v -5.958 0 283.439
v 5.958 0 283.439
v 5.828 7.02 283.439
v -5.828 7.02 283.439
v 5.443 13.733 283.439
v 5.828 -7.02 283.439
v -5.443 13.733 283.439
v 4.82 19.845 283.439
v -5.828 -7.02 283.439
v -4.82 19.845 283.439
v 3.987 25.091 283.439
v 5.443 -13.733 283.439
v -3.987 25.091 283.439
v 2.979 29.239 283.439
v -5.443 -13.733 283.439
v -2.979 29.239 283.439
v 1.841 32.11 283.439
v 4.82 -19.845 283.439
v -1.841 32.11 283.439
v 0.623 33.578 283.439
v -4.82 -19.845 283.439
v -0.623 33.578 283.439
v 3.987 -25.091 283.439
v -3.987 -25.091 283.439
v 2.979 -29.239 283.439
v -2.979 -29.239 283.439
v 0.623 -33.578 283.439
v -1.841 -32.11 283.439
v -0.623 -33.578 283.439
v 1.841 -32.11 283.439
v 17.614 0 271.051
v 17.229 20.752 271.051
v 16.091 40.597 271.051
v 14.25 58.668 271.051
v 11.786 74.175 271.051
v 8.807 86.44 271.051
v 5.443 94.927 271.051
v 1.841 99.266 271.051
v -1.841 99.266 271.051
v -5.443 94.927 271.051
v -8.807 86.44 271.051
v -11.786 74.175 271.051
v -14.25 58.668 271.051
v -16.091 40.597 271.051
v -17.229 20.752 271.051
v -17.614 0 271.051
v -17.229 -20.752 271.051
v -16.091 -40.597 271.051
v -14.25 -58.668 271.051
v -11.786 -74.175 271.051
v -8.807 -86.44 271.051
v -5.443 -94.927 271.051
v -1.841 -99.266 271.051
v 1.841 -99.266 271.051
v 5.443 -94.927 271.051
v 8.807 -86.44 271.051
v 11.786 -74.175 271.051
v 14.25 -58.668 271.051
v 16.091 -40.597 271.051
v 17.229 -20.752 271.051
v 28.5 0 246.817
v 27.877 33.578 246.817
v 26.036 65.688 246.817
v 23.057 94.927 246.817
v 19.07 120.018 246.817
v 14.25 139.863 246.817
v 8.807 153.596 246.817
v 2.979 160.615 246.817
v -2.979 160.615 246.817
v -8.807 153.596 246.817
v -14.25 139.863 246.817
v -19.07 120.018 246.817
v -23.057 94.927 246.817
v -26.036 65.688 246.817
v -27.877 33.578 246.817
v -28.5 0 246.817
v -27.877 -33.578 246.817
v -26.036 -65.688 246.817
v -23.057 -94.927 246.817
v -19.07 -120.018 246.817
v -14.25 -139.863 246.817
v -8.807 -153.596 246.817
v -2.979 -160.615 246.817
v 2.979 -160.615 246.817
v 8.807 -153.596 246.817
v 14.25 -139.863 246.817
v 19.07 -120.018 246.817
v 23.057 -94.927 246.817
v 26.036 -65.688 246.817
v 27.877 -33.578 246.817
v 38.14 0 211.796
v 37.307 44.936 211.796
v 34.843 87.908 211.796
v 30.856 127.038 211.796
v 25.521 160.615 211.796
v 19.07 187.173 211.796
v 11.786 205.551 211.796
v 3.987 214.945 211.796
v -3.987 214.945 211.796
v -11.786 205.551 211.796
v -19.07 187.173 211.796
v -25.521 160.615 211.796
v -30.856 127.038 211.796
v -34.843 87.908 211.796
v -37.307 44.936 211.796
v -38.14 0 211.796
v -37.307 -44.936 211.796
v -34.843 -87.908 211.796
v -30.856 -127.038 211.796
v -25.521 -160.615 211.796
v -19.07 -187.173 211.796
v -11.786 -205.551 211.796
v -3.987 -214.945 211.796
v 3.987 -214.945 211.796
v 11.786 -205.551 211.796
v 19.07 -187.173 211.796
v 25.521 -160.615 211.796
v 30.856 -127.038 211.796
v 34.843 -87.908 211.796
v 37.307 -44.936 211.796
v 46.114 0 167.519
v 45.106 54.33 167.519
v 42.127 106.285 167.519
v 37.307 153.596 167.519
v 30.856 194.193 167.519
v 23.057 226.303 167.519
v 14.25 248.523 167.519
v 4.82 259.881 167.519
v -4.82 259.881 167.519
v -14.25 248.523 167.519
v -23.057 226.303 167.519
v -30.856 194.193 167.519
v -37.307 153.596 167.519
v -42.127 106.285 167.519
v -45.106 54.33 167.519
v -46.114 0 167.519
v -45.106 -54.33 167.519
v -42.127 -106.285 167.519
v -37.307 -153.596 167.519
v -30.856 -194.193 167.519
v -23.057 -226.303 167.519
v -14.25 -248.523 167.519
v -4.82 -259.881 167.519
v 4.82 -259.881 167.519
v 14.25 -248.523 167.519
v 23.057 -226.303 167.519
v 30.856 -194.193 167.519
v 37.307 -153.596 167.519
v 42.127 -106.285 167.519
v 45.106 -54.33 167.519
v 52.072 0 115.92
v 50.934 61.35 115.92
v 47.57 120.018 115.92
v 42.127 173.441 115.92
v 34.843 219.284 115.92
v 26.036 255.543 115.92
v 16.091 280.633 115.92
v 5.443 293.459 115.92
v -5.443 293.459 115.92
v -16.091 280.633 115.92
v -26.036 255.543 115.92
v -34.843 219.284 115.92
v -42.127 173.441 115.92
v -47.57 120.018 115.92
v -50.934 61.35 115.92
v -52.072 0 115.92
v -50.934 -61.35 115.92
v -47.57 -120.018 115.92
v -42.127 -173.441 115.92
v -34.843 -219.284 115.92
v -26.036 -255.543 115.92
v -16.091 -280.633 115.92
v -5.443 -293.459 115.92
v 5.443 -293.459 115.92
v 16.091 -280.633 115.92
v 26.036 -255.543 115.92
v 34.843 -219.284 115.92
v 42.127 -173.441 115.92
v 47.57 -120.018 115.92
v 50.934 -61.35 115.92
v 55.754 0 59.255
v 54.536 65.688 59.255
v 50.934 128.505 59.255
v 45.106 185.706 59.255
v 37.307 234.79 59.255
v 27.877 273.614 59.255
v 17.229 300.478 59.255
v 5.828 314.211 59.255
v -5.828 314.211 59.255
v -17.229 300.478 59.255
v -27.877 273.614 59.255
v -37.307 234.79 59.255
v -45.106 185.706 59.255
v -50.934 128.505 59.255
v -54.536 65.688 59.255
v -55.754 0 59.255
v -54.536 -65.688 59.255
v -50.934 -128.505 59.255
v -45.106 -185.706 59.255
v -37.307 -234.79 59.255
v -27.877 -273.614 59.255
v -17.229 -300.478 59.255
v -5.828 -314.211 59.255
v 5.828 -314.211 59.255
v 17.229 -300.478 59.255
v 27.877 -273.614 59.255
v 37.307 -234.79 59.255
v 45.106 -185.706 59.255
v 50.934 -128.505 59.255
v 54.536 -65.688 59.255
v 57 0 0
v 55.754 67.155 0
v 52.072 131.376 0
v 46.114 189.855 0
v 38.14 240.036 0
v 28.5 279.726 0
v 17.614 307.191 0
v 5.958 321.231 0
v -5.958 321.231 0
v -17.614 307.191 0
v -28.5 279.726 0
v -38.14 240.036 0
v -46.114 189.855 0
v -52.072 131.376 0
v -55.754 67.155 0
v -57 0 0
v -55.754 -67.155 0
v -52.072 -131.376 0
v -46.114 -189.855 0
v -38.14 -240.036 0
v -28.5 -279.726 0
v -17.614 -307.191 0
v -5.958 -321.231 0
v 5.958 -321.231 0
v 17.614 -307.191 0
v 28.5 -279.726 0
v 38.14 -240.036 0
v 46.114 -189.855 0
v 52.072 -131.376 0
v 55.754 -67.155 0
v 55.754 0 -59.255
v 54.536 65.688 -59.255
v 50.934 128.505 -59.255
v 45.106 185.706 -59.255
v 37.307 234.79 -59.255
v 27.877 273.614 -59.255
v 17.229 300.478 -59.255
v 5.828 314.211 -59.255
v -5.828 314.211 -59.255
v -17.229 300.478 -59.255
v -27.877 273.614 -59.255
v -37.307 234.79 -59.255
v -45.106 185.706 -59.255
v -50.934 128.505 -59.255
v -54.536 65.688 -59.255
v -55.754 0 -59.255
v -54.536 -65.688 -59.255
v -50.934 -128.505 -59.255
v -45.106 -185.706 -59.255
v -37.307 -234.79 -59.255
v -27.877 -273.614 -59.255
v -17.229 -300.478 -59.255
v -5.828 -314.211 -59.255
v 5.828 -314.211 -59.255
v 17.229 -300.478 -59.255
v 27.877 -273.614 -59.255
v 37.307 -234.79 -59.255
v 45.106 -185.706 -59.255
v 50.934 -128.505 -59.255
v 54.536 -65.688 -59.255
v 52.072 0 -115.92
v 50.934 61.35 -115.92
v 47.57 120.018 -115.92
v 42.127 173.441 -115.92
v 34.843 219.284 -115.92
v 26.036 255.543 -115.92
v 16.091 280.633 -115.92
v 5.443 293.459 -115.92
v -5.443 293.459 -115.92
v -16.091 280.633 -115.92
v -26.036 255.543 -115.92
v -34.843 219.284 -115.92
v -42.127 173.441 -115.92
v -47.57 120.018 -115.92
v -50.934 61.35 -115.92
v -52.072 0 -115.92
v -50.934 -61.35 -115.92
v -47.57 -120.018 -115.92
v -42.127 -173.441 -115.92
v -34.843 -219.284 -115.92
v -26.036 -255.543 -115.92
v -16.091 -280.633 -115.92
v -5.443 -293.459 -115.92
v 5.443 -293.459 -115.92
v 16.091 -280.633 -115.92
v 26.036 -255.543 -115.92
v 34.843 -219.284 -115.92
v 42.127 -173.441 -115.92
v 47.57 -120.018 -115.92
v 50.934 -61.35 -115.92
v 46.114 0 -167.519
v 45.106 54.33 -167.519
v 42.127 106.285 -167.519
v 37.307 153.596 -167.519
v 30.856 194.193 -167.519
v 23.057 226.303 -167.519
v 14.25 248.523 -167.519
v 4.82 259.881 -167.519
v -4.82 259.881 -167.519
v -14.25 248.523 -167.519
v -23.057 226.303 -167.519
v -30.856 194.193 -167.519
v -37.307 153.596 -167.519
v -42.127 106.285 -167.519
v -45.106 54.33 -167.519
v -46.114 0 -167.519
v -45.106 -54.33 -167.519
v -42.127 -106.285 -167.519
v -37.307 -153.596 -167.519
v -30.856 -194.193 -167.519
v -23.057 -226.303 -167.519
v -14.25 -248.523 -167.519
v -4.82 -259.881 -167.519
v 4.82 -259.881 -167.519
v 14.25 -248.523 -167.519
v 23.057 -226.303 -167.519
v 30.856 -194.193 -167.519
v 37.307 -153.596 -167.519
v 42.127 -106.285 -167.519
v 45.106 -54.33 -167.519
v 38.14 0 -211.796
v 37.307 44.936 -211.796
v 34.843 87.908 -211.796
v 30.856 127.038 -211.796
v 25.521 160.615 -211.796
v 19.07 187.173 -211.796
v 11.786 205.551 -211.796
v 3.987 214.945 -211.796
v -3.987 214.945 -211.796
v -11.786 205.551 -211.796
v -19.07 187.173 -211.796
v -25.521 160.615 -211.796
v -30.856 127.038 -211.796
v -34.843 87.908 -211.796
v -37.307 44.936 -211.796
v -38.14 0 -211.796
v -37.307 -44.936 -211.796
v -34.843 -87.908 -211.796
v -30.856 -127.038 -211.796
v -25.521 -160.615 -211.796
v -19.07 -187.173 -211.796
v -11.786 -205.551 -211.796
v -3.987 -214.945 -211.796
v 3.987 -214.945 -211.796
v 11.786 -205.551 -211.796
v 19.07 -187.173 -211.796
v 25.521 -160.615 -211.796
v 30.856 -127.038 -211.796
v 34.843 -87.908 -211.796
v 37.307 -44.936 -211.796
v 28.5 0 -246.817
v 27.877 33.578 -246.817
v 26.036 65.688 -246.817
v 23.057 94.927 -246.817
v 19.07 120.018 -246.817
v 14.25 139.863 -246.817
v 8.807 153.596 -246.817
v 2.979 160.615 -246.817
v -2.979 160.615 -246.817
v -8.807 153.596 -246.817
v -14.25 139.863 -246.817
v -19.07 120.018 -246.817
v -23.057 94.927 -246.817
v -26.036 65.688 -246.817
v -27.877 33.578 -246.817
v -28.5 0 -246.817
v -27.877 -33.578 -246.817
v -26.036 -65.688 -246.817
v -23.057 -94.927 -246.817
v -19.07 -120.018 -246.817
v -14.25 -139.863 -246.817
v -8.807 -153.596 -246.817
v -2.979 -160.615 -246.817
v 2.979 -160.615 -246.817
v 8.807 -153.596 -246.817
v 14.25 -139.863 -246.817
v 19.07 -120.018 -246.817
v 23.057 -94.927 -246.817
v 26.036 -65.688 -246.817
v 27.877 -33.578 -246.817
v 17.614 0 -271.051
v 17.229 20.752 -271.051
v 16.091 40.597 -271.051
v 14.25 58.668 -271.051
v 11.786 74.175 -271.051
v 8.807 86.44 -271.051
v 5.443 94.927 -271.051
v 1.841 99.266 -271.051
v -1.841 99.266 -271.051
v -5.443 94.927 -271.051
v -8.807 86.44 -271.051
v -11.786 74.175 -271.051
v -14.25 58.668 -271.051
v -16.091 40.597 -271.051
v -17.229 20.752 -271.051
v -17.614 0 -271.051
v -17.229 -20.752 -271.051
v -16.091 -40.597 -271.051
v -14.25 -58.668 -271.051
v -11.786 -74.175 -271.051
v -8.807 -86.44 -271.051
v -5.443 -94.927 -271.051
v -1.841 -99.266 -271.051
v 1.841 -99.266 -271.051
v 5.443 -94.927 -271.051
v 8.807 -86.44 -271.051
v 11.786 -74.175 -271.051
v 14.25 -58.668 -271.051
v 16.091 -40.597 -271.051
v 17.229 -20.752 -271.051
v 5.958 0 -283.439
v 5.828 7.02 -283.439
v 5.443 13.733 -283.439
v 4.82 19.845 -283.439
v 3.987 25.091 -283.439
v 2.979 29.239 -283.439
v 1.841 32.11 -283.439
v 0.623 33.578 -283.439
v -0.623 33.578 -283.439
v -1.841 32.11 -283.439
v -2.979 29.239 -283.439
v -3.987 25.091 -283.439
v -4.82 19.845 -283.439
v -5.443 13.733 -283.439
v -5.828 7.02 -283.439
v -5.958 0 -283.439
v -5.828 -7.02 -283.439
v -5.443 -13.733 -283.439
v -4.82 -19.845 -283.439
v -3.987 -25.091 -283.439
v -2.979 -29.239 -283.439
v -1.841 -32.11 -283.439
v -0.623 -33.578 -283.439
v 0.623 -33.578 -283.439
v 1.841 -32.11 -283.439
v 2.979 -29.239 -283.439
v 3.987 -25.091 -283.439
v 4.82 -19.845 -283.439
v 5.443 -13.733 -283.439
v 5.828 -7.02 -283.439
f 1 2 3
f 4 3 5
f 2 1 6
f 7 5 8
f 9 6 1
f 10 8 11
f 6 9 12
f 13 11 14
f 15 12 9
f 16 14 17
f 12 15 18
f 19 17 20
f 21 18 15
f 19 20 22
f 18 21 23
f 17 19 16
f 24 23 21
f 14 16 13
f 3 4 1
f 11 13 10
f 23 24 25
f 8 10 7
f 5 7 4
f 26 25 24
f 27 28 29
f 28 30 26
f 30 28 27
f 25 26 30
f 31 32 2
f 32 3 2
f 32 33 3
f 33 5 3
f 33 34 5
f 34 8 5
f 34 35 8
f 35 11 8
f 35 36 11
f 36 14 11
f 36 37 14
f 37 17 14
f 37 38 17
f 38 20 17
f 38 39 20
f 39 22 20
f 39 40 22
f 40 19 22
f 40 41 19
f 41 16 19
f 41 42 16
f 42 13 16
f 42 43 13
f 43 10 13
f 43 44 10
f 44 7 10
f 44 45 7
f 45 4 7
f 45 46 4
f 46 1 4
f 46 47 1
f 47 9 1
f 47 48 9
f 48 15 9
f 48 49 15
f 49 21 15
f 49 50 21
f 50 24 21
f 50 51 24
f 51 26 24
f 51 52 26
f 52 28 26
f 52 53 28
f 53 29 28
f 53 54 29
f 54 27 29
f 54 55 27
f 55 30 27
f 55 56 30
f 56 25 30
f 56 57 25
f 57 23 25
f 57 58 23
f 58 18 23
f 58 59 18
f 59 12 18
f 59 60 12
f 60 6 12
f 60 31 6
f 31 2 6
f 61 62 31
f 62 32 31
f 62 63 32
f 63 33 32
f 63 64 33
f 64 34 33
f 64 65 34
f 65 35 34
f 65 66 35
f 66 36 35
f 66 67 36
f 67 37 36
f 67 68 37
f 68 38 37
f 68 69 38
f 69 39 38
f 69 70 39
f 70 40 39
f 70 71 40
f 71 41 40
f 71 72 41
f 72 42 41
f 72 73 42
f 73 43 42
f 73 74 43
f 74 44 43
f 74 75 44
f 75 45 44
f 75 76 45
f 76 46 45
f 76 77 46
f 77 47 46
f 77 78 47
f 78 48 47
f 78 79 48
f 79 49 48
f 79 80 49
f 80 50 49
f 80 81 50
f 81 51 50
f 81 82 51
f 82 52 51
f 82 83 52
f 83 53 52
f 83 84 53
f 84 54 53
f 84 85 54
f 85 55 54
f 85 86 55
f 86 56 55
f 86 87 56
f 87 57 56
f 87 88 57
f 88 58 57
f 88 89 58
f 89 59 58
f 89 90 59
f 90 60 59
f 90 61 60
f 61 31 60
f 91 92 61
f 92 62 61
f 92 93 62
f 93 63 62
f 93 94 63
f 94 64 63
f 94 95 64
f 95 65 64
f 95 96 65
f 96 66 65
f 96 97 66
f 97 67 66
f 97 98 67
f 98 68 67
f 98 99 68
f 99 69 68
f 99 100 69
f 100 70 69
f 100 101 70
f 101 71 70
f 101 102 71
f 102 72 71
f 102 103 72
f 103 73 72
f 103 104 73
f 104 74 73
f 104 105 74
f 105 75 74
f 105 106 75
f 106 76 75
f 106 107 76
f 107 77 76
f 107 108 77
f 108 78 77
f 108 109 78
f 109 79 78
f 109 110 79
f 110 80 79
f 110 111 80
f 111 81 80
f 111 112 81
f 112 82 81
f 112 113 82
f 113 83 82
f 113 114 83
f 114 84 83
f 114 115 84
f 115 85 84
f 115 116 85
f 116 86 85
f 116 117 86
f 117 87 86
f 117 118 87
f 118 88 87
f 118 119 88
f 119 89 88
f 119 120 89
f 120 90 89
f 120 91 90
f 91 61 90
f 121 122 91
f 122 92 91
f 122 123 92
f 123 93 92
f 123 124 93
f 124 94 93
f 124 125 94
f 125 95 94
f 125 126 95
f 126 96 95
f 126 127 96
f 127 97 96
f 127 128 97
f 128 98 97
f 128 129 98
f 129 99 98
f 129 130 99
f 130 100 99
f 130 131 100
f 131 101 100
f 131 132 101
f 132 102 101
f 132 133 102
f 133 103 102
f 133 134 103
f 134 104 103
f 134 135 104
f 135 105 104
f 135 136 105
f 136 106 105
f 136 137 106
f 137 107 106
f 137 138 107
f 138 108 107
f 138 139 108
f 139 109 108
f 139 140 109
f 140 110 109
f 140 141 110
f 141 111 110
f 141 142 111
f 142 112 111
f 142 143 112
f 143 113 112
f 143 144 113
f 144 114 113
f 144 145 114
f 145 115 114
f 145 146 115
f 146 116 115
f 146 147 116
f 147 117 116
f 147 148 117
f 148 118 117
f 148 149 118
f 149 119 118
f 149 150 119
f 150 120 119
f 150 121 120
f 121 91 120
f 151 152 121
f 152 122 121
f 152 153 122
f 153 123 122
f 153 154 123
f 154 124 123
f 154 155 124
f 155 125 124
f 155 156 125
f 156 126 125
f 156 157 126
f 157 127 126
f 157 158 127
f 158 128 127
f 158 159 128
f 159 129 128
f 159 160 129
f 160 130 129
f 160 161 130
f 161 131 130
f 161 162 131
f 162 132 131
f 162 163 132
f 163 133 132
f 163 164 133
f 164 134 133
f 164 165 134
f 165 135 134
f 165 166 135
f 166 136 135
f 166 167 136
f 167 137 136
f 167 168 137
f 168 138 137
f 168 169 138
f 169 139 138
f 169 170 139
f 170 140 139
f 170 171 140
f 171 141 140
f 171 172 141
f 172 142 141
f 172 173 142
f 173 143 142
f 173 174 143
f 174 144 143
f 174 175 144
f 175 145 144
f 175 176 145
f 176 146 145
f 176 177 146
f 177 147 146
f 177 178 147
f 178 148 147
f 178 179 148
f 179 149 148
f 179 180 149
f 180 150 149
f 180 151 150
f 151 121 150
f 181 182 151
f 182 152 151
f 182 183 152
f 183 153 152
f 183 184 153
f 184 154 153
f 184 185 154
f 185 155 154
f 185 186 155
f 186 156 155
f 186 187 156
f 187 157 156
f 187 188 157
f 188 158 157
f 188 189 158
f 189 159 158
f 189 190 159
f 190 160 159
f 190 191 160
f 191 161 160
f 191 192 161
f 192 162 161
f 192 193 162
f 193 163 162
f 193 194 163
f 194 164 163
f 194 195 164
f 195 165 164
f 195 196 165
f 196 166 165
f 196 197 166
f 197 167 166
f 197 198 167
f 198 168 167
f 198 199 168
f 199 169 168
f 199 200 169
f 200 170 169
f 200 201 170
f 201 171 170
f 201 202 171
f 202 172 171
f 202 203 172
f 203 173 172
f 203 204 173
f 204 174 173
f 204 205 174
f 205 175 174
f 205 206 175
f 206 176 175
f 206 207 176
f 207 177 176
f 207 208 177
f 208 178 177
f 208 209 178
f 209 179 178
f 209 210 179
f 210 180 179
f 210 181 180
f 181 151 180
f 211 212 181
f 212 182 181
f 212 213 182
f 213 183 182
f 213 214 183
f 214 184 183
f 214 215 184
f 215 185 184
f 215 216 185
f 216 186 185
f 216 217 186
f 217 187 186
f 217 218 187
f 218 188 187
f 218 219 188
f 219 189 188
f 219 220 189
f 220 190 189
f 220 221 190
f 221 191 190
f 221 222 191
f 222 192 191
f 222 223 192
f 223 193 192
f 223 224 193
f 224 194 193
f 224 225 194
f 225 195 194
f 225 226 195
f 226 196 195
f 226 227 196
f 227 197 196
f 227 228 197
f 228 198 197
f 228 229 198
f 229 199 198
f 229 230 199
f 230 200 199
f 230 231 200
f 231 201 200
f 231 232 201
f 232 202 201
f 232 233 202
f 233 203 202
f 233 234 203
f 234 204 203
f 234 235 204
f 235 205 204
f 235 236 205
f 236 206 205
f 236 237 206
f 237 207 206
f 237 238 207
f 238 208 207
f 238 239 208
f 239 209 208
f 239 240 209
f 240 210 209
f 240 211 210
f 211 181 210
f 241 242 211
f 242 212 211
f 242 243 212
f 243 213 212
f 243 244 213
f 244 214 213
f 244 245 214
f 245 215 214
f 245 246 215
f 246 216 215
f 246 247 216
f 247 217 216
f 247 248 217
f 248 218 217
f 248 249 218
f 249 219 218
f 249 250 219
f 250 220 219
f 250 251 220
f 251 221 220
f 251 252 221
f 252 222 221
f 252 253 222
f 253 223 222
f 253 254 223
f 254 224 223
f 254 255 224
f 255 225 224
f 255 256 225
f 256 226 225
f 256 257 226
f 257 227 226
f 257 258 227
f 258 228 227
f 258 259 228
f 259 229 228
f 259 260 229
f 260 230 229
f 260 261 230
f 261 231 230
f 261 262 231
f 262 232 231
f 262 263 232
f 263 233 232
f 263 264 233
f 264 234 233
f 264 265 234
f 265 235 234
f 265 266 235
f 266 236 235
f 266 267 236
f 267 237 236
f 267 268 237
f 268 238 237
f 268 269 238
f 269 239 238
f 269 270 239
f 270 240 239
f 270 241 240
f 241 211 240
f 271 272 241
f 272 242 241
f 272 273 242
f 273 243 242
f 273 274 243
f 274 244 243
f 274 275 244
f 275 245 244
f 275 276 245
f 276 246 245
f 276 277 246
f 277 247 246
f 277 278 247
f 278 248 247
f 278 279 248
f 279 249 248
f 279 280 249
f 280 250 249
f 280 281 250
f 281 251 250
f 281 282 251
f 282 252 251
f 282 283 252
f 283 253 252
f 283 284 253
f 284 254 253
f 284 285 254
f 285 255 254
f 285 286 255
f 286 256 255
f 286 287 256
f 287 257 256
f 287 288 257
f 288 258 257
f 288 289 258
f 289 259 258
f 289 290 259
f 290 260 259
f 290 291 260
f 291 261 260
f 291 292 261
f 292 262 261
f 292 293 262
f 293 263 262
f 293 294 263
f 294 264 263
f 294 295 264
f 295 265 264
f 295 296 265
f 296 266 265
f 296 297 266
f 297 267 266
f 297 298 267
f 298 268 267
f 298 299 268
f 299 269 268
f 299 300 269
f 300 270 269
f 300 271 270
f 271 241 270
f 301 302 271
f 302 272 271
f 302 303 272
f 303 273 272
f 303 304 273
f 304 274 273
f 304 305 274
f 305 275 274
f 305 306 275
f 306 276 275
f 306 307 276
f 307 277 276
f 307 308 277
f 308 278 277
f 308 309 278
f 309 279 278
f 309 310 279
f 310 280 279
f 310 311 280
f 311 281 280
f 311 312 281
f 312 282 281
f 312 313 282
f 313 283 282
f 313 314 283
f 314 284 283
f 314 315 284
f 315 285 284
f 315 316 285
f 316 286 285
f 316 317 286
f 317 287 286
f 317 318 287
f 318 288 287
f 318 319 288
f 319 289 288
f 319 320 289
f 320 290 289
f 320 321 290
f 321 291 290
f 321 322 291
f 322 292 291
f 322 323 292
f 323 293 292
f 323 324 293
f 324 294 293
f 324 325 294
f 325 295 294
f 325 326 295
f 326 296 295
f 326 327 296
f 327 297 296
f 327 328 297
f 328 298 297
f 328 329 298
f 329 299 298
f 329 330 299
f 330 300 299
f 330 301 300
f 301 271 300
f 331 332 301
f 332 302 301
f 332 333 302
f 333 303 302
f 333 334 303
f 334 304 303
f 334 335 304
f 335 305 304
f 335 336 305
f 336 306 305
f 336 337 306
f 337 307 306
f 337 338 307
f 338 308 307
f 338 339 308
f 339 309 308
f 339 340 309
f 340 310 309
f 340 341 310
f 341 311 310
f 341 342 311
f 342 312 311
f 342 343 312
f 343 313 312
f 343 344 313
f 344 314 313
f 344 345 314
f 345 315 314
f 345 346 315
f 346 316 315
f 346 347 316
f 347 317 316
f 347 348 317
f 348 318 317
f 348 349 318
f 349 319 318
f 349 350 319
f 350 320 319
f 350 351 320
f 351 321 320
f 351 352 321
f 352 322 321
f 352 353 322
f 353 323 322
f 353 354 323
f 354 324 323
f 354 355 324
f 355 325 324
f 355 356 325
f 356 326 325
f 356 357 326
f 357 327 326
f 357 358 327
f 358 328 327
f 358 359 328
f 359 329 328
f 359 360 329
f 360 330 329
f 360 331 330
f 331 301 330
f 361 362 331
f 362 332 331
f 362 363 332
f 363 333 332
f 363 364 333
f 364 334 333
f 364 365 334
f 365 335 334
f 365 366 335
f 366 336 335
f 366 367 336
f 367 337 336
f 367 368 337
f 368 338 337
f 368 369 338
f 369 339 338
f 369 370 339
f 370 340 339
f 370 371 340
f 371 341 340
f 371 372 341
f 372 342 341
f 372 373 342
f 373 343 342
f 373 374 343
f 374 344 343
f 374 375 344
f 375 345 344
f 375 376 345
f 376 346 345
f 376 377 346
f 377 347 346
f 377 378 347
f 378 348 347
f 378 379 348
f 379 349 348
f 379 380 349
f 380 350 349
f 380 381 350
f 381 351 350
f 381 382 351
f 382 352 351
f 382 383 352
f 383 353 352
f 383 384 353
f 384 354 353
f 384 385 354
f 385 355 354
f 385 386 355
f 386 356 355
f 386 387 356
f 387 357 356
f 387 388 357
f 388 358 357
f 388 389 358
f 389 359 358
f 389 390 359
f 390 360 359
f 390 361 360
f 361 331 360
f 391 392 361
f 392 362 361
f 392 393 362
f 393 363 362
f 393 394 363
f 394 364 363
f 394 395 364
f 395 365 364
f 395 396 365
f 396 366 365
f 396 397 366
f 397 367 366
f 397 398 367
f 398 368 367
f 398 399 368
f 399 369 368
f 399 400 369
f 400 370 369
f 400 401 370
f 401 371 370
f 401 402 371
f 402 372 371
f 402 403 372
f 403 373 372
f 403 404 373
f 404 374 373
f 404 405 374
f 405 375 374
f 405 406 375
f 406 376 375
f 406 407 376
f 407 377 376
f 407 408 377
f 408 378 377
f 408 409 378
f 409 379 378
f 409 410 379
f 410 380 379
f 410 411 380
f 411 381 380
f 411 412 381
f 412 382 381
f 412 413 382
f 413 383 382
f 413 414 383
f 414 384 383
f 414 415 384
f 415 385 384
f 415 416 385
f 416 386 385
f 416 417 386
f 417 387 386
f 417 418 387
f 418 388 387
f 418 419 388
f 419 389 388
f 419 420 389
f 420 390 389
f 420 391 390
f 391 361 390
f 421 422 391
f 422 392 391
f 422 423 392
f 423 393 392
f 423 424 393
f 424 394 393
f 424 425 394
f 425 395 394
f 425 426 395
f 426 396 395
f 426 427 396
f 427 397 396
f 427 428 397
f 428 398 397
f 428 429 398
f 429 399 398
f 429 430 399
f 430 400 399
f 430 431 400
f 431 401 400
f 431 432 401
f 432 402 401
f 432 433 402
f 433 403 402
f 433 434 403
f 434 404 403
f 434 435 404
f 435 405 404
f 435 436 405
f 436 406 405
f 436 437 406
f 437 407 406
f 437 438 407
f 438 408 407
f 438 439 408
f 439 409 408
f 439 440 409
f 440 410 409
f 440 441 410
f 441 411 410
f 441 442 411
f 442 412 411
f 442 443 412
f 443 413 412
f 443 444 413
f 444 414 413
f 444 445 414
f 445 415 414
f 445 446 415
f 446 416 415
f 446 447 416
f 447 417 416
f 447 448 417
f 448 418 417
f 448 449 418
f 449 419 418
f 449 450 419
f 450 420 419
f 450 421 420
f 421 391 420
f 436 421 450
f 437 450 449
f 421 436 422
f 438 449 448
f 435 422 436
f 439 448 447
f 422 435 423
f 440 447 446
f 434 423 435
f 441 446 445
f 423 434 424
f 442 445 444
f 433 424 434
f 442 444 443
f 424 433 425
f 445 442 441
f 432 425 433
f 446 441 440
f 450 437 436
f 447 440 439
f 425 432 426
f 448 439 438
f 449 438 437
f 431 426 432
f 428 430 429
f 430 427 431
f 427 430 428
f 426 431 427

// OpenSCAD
// Generated by SolidPython 1.0.1 on 2020-07-29 00:46:46


scale(v = [3, 17, 15]) {
	sphere(r = 19);
}
/***********************************************
*********      SolidPython code:      **********
************************************************
 
# import packages: SolidPython
from solid import *
from solid.utils import *
from itertools import chain, combinations, permutations


class Resize:

    def __init__(self, scad_file):
        self.scad_file = scad_file
        #self.scad_file = import_scad(scad_file)
        # cone/cylinder param:
        self.r1 = 0
        self.r2 = 0
        self.h = 0
        # rectangular prism param:
        self.w = 0
        self.l = 0
        # ellipse param:
        self.r = 0

    # import OpenScad code (file name corresponds to shape)


    # classify shape + parameters
    def assign(self, param1, param2, param3):
        if self.scad_file == 'cone.scad':
            self.r1 = param1
            self.r2 = param2
            self.h = param3
        elif self.scad_file == 'cylinder.scad':
            self.r1 = param1
            self.r2 = param2
            self.h = param3
        elif self.scad_file == 'rectangularPrism.scad':
            self.h = param1
            self.l = param2
            self.w = param3
        else:
            self.r = param1
            self.h = param2

    # resize parameters
    def iterate(self):
        x = range(3, 20, 2)
        i = 1
        if self.scad_file == 'cone.scad':
            tempList = list(permutations(x, 2))
            for temp in tempList:
                param1 = temp[0]
                param2 = temp[1]
                filepath = 'produced_scad_files/' + 'cone' + str(param1) + '_' + str(param2) + '_' + '.scad'
                scad_render_to_file(cylinder(h=param1, r1=param2, r2=0), filepath)

        elif self.scad_file == 'cylinder.scad':
            tempList = list(permutations(x, 3))
            for temp in tempList:
                param1 = temp[0]
                param2 = temp[1]
                filepath = 'produced_scad_files/' + 'cylinder' + str(param1) + '_' + str(param2) + '_' + '.scad'
                scad_render_to_file(cylinder(h=param1, r1=param2, r2=param2), filepath)

        elif self.scad_file == 'rectangularPrism.scad':
            tempList = list(permutations(x, 3))
            for temp in tempList:
                param1 = temp[0]
                param2 = temp[1]
                param3 = temp[2]
                filepath = 'produced_scad_files/' + 'rectangularPrism' + str(param1) + '_' + str(param2) + '_' + str(
                    param3) + '.scad'
                scad_render_to_file(cube(size=(param1, param2, param3)), filepath)

        elif self.scad_file == 'ellipse.scad':
            tempList = list(permutations(x, 4))
            for temp in tempList:
                param1 = temp[0]
                param2 = temp[1]
                param3 = temp[2]
                param4 = temp[3]
                filepath = 'produced_scad_files/' + 'ellipse' + str(param1) + '_' + str(param2) + '_' + str(param3) + '_' + str(param4) + '.scad'
                scad_render_to_file(scale([param1, param2, param3])(sphere(r=param4)), filepath)

    def render_to_scadfile(self):
        scad_render_to_file(scad, 'example.scad') 
 
************************************************/
